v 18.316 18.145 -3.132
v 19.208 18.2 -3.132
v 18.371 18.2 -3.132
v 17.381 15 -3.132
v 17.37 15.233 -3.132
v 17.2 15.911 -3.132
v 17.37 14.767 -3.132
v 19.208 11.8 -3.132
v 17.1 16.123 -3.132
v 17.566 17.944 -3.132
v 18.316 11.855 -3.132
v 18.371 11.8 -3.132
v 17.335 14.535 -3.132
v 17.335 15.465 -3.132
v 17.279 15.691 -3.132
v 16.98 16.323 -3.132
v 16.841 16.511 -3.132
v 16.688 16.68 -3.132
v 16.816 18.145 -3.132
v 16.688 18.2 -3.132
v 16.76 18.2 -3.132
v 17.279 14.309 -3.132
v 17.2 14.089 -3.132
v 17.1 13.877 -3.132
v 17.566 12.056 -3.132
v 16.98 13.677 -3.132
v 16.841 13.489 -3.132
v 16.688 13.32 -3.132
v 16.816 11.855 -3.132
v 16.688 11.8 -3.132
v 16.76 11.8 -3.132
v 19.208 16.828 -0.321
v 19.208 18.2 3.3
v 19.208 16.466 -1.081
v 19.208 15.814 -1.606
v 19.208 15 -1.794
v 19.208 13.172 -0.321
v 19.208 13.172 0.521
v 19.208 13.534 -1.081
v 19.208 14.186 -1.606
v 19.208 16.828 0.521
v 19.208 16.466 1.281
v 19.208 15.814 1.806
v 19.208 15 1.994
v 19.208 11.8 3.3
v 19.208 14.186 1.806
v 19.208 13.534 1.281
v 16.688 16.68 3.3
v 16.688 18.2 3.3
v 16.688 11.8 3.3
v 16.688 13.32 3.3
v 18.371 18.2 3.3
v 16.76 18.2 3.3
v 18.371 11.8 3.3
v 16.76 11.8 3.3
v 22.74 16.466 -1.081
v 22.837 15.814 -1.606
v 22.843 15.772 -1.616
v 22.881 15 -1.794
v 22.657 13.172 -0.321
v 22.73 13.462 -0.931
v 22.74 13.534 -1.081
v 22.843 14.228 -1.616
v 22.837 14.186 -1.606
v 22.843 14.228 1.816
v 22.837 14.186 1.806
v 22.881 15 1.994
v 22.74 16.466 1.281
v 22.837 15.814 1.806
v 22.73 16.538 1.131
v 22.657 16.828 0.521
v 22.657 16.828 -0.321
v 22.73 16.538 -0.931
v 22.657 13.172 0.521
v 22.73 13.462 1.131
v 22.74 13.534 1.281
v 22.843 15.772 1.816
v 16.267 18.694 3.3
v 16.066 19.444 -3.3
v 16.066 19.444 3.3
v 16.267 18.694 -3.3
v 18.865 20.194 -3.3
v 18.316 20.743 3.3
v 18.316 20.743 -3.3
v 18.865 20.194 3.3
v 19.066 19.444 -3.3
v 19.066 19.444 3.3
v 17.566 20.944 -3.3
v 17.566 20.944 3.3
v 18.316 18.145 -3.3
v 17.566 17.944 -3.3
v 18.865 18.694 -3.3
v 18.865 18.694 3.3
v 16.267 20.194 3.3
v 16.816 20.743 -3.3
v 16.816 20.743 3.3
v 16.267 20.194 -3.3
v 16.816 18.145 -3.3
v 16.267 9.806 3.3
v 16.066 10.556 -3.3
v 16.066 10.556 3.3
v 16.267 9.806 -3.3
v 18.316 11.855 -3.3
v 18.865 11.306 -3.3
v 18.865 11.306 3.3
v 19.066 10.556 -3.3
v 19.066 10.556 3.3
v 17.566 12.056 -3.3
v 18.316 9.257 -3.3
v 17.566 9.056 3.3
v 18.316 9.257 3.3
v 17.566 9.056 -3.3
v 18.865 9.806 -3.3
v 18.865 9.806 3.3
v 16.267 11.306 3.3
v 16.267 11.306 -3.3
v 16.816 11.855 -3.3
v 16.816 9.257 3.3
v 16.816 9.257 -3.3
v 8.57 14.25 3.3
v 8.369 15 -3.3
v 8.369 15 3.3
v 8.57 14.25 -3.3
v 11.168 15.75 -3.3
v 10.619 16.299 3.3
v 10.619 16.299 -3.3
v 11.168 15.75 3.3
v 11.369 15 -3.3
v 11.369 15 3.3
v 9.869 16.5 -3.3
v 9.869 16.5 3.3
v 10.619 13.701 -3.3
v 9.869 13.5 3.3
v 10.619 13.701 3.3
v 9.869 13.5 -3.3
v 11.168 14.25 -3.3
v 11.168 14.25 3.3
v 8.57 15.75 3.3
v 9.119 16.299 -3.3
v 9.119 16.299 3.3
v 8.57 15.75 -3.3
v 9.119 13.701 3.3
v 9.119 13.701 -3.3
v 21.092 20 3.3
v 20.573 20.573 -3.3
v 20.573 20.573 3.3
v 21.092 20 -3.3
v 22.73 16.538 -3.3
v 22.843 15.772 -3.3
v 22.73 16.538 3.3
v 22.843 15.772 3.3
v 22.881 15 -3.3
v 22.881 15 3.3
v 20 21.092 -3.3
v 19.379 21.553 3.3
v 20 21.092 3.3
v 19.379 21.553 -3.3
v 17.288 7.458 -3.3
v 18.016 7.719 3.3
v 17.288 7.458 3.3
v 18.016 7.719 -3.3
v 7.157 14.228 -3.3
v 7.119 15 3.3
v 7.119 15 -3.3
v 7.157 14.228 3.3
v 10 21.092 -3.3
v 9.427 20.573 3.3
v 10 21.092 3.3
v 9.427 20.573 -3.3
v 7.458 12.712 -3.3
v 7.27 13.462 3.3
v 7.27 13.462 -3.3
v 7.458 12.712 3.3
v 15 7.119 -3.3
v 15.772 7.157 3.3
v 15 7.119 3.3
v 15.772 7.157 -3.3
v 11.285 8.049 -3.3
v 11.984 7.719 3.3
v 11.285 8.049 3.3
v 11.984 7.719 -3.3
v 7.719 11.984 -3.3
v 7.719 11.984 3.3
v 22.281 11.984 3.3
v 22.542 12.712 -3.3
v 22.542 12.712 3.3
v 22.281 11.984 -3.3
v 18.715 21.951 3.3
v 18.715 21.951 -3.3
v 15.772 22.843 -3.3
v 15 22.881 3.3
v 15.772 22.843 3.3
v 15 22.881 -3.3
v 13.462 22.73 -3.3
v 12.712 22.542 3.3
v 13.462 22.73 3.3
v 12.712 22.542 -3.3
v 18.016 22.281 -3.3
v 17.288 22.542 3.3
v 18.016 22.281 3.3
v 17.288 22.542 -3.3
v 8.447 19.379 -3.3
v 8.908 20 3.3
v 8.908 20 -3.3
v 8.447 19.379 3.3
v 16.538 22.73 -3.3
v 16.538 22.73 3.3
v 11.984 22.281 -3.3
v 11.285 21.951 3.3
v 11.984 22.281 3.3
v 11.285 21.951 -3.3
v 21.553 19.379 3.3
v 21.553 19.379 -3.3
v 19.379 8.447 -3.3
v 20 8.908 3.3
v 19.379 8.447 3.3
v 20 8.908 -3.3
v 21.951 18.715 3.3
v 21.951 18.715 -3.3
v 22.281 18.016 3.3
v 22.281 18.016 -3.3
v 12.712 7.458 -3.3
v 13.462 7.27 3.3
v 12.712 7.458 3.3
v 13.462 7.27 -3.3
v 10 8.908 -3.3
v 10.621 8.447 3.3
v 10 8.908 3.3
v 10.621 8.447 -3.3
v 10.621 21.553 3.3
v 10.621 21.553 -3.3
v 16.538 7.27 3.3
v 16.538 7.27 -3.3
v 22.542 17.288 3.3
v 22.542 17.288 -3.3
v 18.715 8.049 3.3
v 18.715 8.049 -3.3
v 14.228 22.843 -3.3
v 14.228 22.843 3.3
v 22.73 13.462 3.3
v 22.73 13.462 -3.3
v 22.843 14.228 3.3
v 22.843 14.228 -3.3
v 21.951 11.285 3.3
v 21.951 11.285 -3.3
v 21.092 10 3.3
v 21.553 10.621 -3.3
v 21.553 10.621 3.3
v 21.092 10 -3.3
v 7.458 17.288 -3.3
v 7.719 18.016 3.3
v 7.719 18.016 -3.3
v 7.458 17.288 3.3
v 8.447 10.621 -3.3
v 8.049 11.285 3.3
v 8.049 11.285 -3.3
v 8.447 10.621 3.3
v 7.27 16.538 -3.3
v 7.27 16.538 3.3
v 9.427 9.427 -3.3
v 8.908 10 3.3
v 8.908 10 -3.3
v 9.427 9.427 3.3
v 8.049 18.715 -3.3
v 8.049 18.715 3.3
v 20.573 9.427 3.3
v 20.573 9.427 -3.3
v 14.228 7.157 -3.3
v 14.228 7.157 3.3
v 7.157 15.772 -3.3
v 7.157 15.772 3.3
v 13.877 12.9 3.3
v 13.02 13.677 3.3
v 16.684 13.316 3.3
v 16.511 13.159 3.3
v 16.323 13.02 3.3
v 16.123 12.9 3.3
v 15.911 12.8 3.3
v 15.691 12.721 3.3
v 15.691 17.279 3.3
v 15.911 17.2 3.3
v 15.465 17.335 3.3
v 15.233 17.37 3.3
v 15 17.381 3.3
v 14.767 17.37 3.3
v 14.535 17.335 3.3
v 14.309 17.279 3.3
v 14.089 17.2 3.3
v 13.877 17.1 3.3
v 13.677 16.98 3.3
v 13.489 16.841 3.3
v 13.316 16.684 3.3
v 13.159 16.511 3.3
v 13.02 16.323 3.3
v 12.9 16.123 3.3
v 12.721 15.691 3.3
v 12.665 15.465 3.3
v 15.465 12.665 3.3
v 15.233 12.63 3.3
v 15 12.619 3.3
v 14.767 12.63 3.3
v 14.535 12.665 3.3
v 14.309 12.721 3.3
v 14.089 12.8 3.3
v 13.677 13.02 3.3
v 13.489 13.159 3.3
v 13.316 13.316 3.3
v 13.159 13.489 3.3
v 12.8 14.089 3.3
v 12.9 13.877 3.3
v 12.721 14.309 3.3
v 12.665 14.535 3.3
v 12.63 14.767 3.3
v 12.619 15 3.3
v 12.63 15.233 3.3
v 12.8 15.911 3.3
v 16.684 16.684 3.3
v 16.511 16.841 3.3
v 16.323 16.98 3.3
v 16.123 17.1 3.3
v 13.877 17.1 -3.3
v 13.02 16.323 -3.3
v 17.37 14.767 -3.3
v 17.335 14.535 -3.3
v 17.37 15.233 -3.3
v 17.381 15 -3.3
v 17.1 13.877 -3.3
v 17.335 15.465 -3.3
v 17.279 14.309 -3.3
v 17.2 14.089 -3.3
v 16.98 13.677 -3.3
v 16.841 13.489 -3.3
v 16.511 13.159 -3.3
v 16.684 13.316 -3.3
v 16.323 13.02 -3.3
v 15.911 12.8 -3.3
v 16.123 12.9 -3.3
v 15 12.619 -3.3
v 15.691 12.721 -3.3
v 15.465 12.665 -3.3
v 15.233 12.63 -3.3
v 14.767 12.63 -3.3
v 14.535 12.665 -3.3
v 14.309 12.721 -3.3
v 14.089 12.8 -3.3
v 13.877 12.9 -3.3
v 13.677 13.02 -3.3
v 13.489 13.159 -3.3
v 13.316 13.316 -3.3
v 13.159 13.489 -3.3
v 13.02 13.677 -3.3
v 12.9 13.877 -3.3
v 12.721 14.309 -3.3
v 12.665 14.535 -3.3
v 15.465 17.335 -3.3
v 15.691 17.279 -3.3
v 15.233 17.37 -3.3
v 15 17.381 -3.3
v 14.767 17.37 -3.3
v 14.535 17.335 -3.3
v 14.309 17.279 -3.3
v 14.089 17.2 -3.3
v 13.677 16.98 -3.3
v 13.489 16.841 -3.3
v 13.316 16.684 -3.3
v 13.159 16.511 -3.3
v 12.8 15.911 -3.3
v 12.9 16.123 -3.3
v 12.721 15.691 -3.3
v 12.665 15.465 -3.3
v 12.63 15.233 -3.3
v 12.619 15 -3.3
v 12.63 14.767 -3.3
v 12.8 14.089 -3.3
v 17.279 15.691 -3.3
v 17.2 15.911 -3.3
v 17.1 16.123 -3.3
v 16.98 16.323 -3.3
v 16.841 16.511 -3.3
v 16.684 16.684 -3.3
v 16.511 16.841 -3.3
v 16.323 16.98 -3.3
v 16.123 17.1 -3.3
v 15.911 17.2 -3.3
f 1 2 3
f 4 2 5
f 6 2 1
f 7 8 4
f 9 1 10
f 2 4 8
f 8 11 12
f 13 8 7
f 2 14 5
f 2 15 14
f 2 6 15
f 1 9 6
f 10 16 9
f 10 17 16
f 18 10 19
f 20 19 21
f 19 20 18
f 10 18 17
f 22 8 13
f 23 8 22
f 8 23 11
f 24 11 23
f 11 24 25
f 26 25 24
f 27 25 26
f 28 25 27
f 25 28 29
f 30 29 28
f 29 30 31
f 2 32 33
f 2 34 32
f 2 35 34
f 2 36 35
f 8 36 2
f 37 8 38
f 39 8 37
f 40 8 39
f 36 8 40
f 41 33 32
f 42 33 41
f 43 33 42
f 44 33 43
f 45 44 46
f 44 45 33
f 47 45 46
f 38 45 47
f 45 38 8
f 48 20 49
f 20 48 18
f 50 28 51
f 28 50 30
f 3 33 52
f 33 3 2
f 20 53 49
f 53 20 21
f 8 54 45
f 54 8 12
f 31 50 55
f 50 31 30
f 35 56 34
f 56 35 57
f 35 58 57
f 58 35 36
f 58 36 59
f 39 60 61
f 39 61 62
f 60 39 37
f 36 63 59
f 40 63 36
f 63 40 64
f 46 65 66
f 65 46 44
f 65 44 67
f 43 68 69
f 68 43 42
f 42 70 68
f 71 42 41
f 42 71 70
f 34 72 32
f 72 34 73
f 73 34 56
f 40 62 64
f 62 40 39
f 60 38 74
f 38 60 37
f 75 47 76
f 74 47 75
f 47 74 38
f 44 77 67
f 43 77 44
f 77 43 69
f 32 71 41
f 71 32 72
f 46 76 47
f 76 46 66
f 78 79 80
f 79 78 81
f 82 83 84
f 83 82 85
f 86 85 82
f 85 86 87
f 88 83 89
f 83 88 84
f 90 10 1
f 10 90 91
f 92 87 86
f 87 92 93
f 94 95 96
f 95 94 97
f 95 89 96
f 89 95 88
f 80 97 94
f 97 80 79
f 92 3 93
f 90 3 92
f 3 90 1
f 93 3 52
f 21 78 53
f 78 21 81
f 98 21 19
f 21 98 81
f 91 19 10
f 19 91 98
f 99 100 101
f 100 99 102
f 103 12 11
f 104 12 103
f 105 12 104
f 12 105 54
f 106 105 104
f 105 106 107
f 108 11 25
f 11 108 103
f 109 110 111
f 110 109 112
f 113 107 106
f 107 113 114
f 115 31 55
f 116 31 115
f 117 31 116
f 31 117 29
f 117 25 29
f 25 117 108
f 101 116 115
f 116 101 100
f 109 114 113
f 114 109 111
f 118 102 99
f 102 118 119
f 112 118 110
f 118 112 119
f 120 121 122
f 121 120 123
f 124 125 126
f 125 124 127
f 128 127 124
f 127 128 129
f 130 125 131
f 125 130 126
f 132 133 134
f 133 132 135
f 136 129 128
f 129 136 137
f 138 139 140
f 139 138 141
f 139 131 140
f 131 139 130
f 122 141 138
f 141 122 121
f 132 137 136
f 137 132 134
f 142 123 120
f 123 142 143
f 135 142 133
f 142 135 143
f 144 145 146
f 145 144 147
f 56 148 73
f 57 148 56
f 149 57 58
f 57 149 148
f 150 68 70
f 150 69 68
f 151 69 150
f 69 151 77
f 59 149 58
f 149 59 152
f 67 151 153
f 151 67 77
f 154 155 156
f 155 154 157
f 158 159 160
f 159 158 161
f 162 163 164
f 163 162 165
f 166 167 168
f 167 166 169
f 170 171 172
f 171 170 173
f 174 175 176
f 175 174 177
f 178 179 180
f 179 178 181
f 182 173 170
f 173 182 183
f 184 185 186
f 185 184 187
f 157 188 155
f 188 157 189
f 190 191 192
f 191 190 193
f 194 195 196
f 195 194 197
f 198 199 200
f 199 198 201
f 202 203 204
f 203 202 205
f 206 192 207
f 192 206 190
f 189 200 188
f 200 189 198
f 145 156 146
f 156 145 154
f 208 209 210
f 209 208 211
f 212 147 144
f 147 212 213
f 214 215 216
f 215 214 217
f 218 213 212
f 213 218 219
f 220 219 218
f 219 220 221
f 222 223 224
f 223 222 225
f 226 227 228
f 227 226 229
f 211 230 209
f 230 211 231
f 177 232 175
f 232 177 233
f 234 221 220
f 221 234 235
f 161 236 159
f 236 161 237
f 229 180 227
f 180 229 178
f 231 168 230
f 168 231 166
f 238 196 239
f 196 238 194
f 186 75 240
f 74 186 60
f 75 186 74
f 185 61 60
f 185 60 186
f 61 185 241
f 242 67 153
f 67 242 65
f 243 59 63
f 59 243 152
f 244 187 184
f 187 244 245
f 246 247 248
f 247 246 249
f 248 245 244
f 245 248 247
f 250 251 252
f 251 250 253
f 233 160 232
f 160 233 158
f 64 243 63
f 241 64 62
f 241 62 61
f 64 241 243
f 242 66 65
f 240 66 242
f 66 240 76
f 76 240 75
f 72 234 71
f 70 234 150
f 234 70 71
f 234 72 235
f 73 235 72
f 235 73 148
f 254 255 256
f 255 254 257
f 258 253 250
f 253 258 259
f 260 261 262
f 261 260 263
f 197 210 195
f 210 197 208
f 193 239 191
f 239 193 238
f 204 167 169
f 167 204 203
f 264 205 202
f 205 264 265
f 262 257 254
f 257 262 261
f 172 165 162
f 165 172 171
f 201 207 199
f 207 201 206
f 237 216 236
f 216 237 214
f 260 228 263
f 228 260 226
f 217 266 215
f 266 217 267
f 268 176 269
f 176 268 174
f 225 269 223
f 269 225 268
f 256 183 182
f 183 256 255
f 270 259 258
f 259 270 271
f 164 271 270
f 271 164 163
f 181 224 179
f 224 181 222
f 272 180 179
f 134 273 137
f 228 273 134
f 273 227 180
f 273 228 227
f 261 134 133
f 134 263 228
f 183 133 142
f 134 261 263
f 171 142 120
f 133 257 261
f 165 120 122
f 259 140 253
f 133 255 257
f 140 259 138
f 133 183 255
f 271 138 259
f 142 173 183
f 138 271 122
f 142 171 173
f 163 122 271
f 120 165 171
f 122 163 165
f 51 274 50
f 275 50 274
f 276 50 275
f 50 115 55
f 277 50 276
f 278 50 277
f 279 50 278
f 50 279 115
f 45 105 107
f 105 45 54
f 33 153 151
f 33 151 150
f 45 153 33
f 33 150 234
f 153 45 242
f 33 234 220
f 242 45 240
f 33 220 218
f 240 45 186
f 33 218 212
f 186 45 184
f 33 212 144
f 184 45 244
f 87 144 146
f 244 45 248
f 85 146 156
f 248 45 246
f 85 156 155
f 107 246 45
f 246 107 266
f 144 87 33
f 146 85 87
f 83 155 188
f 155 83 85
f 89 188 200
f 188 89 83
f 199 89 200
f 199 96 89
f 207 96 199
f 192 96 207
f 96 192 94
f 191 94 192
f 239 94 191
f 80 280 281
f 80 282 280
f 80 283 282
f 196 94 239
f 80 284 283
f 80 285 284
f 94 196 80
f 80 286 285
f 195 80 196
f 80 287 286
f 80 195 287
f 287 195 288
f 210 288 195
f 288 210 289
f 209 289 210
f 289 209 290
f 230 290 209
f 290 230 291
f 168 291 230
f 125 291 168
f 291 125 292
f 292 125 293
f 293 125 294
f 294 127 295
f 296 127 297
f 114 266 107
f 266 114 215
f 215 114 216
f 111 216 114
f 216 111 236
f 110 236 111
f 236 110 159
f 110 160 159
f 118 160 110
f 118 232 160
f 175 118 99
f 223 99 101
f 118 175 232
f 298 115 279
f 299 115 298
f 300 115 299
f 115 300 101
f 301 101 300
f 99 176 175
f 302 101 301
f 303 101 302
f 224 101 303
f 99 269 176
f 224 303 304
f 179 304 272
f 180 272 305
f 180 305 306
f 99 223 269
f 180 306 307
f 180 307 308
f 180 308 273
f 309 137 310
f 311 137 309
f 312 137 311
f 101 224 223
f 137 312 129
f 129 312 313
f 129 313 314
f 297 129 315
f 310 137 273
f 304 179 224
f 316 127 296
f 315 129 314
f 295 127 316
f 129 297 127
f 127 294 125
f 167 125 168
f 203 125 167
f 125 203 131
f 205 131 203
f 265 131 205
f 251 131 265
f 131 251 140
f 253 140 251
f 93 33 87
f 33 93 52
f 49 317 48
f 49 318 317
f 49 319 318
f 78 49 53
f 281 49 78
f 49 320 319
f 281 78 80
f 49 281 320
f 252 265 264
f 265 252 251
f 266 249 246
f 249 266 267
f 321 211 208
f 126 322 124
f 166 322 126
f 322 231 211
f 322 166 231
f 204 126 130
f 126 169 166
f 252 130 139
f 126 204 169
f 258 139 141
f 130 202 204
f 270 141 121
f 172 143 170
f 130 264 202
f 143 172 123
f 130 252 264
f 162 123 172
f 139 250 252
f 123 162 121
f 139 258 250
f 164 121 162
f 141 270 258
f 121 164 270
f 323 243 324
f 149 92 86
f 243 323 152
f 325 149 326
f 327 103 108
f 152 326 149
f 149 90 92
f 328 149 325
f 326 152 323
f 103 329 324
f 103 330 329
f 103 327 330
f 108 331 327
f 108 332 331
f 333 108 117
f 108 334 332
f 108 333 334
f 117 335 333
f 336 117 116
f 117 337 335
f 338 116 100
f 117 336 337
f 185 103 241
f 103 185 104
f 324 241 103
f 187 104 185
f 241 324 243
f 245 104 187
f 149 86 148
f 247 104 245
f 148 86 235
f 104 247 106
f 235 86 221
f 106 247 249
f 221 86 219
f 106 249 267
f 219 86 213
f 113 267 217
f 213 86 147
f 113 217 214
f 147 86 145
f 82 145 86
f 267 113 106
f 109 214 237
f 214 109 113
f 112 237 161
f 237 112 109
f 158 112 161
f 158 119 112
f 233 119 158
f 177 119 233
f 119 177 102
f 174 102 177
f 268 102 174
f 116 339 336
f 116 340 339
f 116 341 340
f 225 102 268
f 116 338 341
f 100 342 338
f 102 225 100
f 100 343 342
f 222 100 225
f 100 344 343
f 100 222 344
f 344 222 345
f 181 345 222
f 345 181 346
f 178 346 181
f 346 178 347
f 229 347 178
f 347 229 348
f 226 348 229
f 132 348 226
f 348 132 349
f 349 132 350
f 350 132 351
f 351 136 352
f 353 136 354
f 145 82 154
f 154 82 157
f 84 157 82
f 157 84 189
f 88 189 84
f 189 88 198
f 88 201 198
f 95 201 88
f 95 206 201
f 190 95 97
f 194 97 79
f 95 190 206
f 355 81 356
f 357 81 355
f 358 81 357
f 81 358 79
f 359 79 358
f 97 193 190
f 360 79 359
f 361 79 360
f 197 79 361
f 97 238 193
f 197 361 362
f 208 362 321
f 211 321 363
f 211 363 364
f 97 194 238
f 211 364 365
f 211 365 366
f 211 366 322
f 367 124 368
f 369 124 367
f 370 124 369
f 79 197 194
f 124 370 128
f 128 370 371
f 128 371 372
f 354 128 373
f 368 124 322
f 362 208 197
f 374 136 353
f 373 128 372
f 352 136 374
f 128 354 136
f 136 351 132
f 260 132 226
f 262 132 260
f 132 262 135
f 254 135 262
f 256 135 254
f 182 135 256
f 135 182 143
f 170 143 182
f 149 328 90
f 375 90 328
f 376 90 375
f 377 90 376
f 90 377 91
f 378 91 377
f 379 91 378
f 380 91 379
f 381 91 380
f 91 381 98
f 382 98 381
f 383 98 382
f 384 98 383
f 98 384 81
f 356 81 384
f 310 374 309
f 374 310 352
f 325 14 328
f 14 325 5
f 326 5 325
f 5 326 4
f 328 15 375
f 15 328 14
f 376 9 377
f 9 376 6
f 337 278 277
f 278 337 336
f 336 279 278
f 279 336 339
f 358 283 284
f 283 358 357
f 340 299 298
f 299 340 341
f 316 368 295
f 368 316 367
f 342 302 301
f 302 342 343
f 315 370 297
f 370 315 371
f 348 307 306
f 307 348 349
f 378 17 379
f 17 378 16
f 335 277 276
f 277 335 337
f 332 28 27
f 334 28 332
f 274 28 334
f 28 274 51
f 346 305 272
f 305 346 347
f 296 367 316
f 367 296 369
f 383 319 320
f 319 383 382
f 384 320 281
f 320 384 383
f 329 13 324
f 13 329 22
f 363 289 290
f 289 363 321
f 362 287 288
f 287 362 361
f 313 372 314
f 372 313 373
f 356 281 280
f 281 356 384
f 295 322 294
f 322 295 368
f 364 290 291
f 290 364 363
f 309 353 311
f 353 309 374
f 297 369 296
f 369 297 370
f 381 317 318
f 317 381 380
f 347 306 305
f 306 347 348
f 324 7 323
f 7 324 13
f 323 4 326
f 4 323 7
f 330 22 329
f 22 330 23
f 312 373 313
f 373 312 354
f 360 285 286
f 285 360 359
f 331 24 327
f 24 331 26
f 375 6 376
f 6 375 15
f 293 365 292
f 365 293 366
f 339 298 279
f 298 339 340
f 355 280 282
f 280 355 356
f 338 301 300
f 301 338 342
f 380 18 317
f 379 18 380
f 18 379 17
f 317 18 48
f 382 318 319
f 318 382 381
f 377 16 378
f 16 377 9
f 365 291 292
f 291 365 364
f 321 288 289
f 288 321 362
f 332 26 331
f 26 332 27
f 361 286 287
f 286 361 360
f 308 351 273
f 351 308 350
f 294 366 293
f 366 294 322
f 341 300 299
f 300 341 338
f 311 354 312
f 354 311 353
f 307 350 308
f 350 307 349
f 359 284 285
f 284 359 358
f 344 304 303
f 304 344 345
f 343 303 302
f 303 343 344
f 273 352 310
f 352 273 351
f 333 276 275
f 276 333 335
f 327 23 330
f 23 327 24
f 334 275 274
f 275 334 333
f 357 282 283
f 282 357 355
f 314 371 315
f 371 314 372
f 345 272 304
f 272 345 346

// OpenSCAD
// stackable trays bolt together
// topper narrows to exact card size for camera positioning
// IR sensor positions allow mcu to adjust card height
// screw drive allows stepper disable to reduce power/heat
// 100lb test thread x 4 for lifting

/*
#figure shaft-center distances for gearing:
# copy echo locations
import numpy as np

 def dist (a,b):
    x = (a[0] - b[0])*(a[0] - b[0])
    y = (a[1] - b[1])*(a[1] - b[1])
    return np.sqrt(x+y)
*/
// a is stepper center, b and c are top-bearing center, d is bottom bearing center
// using dist(a, d) above, found that bottom bearing to stepper center is 41.471
// dist(d, c) == 44, dist(a,c) == 54.573


use <bearing.scad>;

// * bearing(pos=[0,0,0], angle=[0,0,0], model=SkateBearing, outline=false, material=Steel, sideMaterial=Brass);

use <motors.scad>;

// * stepper_motor_mount(nema_standard, slide_distance=0, mochup=true, tolerance=0);

use <hardware.scad>;

// * screw(length, nutpos, washer, bearingpos = -1);

use <involute_gears.scad>;

use <auger.scad>;

end_x = 2.5*25.4 + 22 + 20;
end_y = 70;

//localauger();
//setscrew();
//setwheel();
translate([15,15,0])
    setwheel(shaftrad=3/32 * 25.4);
//end_plate();
//end_mold();
//sideplate();
//screwin();
//opb6xx();
/*
translate([- 10, 0, 0])
    biscuit(cutout=0);
translate([- 20, 0, 0])
    biscuit(cutout=0);
*/
//translate([10, 0, 0])
//    biscuit(cutout=1);

module screwin(ang=0, tail=10, nutpos=9, shaft=12){
    rotate([0,0,ang])
    screw(shaft, nutpos, 0, $fn=24);
    translate([0,-5.8/2,-nutpos-2.5])
       cube([tail,5.8,2.5], center=false);
}

module biscuit(rnd=4, length=30, holes=1.6, cutout=0){
    difference(){
        union(){
            for (i=[0,length-rnd*2]){
                translate([0,i,0])
                    cylinder(r=holes, h=22, center=true, $fn=24);
            }
            scale([1+cutout/100, 1+cutout/100, 1+cutout/100])
            hull(){
                cylinder(r=rnd, h=1.2, $fn=36);
                translate([0,length-rnd*2,0])
                    cylinder(r=rnd, h=1.2, $fn=36);
            }
        }
        if (cutout == 0){
            for (i=[0,length-rnd*2]){
                translate([0,i,0])
                    cylinder(r=holes+.05, h=22.1, center=true, $fn=24);
            }
        }
    }
}

module end_plate(x = end_x, y = end_y, thk = 6.9, boltlen=12){
    difference(){
        minkowski(){
        cylinder(.01,1.5,center=false, $fn=20);
        cube([x,y,thk], center=false);
        }
        translate([x/2, 41.4/2, 22]) rotate([180,0,0]){
            #steppercut();
            echo("stepper center at ", [x/2, 41.4/2, 22]);
        }
        
        for (i=[1,-1]){
            translate([x/2 + i*2.5/2*25.4+i*9,13,0]){
                echo("bearing center at ",[x/2 + i*2.5/2*25.4+i*9,13,0]);
                cylinder(r=22.2/2, h=20, center=true, $fn=64);
            }
            translate([x/2 + i*2.5/2*25.4+i*9,y-13,0]){
                echo("bearing center at ",[x/2 + i*2.5/2*25.4+i*9,y-13,0]);
                cylinder(r=22.2/2, h=20, center=true, $fn=64);
            }
            translate([x/2 + i*2.5/2*25.4+i*boltlen/2+i*20,y/2-10,thk/2]) rotate([0,90,90-90*i])
                #screwin(ang=0, tail=10, nutpos=8, shaft=12);
            translate([x/2 + i*2.5/2*25.4+i*boltlen/2+i*20,y/2+10,thk/2]) rotate([0,90,90-90*i])
                #screwin(ang=0, tail=10, nutpos=8, shaft=12);
            translate([x/2 + i*2.5/4*25.4,y+4,thk/2]) rotate([0,-270,90])
                #screwin(ang=0, tail=10, nutpos=8, shaft=12);
            translate([x/2 + i*2.5/4*25.4 + i*5, y-10, thk-1.18]) rotate([0,0,0])
                #biscuit(cutout=1);
        }
    }
}

module end_mold(x = end_x, y = end_y, thk = 7, boltlen=12){
    // a positive for cutting into side-panels
    translate([thk+1, 0, 4]) rotate([0,-90,0]){
    cube([thk,y,thk], center=false);
        for (i=[-1]){
            translate([x/2 + i*2.5/2*25.4+i*boltlen/2+i*20,y/2+10,thk/2]) rotate([0,90,90-90*i])
                    screwin(ang=0, tail=10, nutpos=8, shaft=12);
            translate([x/2 + i*2.5/2*25.4+i*boltlen/2+i*20,y/2-10,thk/2]) rotate([0,90,90-90*i])
                    screwin(ang=0, tail=10, nutpos=8, shaft=12);
        }
    }
}

module opb6xx(
    sensor_bottom_x = 5,
    sensor_bottom_y = 4.6,
    sensor_bottom_z = 1.7,
    sensor_top = [6.35,4.6,3.3]){
        
    sensor_bot = [sensor_bottom_x,sensor_bottom_y,sensor_bottom_z];
    totalsensor_ht = sensor_top[2] + sensor_bottom_z;
        
    for (j=[-1,1]){
        translate([0, j*(y/2 - sensor_bottom_y/2), -8.25]){
            translate([0,0,sensor_bottom_z/2])
                #cube(sensor_bot, center=true);
            translate([0,0,totalsensor_ht/2 + sensor_bottom_z/2- 0.1])
                #cube(sensor_top, center=true);
        cube([sensor_bottom_x, sensor_bottom_y, 16], center=true);
        cylinder(r=sensor_bottom_x/2-0.25, h=17, center=false);  
        }
    }
}

module sideplate(x = 3.5*25.4 + 16 + 50, y = end_y, z = 5){
    // structure
    difference(){
        cube([x,y,z], center=false);
        end_mold();
        translate([x, y, 0]) rotate([0,0,180])
            end_mold();
        for (i=[2/7, 5/7]){
            translate([x/2, y*i, 0]) scale([5,1.18,1]){
                #cylinder(r=y/6, h=z+.1, center=false, $fn=128);
            }
            translate([x*i*0.9, 2.2, 5.7]) rotate([180,0,0])
                #opb6xx();
        }
        for (i=[1,-1], j=[y-10, -10]){
            translate([x/2+i*(x-32)/2, j, z-1.19])
                biscuit(cutout=1);
        }
    }
}

module steppercut(xy=42.3, curve=5.7, tall=20){
    linear_extrude(height=tall)
        minkowski(){
            square([xy-curve, xy-curve], center=true);
            circle(r = curve/2, center=true, $fn=16);
        }
    linear_extrude(height=tall+12)
        stepper_motor_mount(17, slide_distance=0, mochup=true, tolerance=0);
}

module setscrew(nutsq=[6.4,6.4,2.1], bolt=[5.5, 3.75/2], cap=[2.65,6.25/2]){
    translate([-nutsq[0]/2, -nutsq[1]/2, 0])    
        cube(nutsq, center=false);
    cylinder(r=bolt[1],h=bolt[0], center=false, $fn=14);
    translate([0,0,bolt[0]])
        cylinder(r=cap[1], h=cap[0], center=false, $fn=22);
}

module setwheel(shaftrad=7.95/2, nutplay=8.15-2.1, setlen=5.5){
    difference(){
    cylinder(r=shaftrad+setlen, h=6.6, $fn=64, center=true);
    
    // shaft of main
    cylinder(r=shaftrad, h=12, $fn=64, center=true);
    
    rotate([0,90,0]) translate([-.1,0,shaftrad/1.411]) scale([1.01,1,1.2])
        setscrew();
    for (i=[30,150,270]){
        translate([(shaftrad+setlen/2)*sin(i), (shaftrad+setlen/2)*cos(i), -7.1])
            cylinder(r=1.5, h=30, $fn=12, center=false);
    }
    }
}

module localauger(){
    auger(r1 = shaftrad+setlen, r2 = shaftrad+setlen+5, h=20, multiStart=1,
        turns=3, pitch=20,
        flightThickness = 3, overhangAngle=20, supportThickness=0*mm,
        handedness="right" /*"left"*/);
}
    
